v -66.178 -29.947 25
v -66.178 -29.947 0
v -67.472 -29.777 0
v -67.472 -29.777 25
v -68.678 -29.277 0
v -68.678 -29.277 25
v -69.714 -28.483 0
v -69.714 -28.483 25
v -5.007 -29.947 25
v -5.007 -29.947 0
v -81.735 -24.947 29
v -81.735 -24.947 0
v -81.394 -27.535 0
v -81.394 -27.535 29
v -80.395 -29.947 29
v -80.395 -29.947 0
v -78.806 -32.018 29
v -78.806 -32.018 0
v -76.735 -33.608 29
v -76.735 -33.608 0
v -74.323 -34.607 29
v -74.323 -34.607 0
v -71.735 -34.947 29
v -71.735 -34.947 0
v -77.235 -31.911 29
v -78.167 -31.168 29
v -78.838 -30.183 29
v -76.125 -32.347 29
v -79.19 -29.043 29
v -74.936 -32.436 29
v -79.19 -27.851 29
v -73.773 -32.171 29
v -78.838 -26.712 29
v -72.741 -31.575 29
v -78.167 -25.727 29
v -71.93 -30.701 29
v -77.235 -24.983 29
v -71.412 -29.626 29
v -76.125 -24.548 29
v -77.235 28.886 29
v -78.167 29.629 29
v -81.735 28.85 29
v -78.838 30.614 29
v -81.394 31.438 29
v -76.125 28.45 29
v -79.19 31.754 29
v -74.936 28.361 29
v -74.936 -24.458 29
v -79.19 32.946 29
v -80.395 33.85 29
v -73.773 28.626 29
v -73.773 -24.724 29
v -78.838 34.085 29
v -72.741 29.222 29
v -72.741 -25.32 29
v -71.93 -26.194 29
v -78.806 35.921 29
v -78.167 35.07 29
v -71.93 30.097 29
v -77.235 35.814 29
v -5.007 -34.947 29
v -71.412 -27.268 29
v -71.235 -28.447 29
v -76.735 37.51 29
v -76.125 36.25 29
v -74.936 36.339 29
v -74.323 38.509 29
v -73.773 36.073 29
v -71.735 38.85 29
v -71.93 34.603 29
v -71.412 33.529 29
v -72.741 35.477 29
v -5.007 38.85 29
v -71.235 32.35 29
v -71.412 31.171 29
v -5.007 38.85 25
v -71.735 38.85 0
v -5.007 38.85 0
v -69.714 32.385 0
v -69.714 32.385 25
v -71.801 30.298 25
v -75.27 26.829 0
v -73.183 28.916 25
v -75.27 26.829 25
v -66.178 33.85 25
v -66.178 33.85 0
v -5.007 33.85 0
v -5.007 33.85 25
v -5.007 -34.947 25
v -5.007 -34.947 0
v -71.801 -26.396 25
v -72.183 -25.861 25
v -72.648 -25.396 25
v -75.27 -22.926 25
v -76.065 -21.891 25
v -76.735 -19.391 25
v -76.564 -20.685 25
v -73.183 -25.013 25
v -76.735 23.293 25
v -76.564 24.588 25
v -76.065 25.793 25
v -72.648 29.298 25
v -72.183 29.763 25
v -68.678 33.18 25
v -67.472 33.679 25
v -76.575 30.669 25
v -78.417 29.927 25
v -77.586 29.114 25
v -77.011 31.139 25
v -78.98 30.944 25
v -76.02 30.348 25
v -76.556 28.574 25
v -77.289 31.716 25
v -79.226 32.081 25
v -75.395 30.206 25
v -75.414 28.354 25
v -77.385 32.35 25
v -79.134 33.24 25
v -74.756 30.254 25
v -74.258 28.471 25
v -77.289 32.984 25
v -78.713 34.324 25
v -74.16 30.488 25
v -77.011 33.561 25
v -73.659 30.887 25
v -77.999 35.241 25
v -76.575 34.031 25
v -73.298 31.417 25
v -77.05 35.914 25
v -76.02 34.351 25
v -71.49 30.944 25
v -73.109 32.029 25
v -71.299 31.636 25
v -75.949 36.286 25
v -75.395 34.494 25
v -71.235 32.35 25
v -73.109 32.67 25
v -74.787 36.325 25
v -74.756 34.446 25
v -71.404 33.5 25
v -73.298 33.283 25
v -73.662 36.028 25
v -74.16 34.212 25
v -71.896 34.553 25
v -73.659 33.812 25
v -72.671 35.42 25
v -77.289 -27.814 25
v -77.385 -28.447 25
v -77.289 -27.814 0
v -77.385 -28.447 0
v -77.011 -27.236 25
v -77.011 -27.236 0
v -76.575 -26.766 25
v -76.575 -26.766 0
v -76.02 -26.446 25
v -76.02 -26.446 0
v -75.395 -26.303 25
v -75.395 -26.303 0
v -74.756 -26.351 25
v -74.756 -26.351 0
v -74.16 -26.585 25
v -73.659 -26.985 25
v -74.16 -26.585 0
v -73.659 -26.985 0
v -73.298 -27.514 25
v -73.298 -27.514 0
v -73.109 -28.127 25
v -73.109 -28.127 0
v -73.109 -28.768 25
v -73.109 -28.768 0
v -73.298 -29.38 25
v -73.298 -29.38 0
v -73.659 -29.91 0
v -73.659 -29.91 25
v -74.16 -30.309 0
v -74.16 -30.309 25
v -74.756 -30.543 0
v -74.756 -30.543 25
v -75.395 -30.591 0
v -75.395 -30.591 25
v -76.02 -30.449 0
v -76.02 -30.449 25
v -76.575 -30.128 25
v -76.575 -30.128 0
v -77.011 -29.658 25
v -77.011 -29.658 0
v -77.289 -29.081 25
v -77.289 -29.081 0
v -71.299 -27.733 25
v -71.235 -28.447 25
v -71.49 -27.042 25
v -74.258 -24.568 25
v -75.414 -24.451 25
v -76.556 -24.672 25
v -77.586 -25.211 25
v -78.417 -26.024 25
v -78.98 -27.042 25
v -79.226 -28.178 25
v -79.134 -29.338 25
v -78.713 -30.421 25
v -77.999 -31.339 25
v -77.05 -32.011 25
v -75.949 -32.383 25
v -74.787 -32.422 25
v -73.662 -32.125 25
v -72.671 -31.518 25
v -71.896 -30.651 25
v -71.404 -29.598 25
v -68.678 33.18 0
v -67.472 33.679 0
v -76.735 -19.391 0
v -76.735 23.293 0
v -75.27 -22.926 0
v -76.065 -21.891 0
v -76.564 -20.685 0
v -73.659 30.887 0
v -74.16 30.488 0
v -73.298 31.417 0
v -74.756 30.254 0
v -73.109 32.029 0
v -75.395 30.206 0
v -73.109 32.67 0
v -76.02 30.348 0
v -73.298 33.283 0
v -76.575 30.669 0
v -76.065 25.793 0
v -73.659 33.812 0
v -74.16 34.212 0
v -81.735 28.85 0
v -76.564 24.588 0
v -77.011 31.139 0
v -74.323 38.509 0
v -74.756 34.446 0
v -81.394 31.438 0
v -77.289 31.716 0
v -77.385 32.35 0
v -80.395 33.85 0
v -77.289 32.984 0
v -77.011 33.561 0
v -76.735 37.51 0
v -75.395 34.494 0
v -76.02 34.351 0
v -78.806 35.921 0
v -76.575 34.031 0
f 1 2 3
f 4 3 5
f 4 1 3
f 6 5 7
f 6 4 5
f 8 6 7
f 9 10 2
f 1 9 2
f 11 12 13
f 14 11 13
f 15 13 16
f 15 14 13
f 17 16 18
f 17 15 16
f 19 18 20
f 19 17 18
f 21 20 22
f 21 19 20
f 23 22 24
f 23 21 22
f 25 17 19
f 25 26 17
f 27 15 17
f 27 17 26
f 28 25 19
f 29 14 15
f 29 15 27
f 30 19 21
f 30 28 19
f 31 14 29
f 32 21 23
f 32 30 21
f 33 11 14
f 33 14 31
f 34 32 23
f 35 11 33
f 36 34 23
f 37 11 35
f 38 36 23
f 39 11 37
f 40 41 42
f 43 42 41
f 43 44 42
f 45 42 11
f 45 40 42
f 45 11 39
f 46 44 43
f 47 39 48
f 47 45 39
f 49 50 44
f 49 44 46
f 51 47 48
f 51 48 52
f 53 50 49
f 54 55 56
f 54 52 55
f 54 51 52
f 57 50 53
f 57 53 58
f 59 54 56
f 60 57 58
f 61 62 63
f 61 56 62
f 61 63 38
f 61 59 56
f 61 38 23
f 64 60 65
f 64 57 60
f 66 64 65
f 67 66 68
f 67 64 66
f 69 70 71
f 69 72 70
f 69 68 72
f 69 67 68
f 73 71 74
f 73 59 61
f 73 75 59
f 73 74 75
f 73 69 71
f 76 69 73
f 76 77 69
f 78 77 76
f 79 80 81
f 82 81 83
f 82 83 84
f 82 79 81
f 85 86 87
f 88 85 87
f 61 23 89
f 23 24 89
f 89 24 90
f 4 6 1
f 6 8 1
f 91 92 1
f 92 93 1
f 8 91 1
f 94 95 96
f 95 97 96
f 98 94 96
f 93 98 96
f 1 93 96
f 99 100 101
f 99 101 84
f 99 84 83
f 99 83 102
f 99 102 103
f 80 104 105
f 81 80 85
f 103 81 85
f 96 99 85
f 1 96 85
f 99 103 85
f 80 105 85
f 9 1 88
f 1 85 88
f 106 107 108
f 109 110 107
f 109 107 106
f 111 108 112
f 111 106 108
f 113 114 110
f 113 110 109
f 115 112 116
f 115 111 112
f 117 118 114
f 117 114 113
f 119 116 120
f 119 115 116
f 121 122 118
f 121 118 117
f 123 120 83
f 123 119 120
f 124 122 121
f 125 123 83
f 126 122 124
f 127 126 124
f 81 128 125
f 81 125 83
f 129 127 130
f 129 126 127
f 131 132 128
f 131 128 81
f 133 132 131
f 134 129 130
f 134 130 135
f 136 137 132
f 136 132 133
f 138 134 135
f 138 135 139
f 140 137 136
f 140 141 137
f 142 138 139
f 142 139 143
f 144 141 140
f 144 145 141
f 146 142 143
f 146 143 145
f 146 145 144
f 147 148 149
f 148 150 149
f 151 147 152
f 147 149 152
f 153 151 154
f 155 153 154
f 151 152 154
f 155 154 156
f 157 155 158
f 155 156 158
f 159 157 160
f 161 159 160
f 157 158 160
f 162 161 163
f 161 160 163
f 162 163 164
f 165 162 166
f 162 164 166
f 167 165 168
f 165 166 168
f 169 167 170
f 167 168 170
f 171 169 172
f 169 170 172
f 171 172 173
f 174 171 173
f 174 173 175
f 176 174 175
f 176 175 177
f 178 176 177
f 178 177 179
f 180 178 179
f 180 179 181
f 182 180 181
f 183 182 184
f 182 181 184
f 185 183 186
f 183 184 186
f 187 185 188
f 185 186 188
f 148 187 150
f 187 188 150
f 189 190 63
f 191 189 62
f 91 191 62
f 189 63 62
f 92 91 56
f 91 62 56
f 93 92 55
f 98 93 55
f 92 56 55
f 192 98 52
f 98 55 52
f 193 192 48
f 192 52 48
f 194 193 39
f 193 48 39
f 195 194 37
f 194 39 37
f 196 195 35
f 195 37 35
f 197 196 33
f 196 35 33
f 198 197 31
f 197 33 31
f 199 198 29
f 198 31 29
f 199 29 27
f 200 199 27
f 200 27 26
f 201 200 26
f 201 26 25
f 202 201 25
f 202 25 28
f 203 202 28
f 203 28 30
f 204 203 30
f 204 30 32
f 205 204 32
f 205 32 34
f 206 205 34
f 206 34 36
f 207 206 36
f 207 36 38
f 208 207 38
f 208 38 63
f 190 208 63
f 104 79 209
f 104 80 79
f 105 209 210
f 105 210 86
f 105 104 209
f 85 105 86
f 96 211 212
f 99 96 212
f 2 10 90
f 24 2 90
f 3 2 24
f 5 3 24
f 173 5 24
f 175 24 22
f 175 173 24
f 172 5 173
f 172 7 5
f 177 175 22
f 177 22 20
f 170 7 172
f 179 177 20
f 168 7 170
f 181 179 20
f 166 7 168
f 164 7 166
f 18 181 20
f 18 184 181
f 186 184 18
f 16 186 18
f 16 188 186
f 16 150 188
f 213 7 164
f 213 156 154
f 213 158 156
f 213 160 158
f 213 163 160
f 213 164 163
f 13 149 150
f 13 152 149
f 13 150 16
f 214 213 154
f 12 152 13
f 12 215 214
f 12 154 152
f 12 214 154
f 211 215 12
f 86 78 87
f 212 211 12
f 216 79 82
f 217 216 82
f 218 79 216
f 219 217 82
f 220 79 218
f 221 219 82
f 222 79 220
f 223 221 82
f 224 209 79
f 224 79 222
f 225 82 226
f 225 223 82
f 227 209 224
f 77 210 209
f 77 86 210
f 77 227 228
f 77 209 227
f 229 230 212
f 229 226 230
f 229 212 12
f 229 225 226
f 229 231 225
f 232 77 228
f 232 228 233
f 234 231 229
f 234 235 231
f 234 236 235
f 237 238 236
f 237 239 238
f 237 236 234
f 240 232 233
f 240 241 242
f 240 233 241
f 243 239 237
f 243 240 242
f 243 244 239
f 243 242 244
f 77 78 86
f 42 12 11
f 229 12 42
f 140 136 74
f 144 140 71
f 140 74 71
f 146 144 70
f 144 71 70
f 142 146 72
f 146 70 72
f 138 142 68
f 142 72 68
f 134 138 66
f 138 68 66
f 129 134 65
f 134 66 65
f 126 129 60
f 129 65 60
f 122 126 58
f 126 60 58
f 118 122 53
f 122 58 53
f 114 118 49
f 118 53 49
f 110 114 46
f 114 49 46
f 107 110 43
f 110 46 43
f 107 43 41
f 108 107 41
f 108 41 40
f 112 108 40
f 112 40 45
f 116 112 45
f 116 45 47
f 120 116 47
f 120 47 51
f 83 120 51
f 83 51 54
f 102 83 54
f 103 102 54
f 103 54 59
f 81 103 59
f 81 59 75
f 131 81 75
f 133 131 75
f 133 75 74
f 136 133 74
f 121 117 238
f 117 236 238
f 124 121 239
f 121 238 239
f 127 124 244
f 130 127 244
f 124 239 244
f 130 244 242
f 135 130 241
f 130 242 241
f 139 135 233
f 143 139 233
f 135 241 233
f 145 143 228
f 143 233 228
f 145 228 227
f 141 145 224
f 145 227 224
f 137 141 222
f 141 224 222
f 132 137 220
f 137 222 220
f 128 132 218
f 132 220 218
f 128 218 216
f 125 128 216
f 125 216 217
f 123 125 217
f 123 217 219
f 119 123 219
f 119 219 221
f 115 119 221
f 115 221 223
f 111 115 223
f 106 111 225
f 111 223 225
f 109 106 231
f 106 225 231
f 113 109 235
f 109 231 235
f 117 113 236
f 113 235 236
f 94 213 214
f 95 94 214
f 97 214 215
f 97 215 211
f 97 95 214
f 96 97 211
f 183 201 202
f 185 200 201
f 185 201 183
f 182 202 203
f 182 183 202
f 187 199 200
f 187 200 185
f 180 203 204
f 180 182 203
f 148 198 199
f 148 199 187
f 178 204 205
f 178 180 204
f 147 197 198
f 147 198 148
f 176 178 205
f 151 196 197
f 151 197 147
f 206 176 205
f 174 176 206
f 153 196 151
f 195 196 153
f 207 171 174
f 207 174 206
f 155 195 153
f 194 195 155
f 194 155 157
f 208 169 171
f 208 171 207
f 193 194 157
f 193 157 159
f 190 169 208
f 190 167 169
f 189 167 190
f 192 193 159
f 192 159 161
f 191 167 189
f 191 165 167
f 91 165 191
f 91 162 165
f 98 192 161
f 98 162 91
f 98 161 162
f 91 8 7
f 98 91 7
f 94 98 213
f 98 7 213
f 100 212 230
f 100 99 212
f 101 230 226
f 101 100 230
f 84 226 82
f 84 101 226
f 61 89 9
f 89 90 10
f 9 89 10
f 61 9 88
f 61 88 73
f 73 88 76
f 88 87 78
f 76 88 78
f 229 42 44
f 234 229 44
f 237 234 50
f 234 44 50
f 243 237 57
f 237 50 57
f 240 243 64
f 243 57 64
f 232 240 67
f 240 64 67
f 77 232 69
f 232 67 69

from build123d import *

# Parameters (mm, degrees)
EXTRUDE_THIN1_DEPTH            = 25
BOSS_EXTRUDE1_DEPTH            = 25
SKETCH3_W                      = 76.727105056
SKETCH3_H                      = 73.797041503
BOSS_EXTRUDE2_DEPTH            = 4
FILLET1_R                      = 10
FILLET2_R                      = 5
CBORE_FOR_M4_SHCS1_D           = 4.3
CBORE_FOR_M4_SHCS1_CBORE_D     = 8
CBORE_FOR_M4_SHCS1_CBORE_DEPTH = 4


with BuildPart() as part:
    # Sketch1 → Extrude-Thin1 (new body)
    with BuildSketch(Plane.XY):
        Polygon((-5.007497798, -29.94725217), (-76.734602854, -29.94725217), (-76.734602854, 33.849789333), (-5.007497798, 33.849789333), (-5.007497798, 38.849789333), (-81.734602854, 38.849789333), (-81.734602854, -34.94725217), (-5.007497798, -34.94725217), align=None)
    extrude(amount=EXTRUDE_THIN1_DEPTH)

    # Sketch2 → Boss-Extrude1 (add)
    with BuildSketch(Plane.XY):
        Polygon((-68.24932148, 33.849789333), (-76.734602854, 25.364507959), (-76.734602854, 33.849789333), align=None)
        Polygon((-76.734602854, -29.94725217), (-68.24932148, -29.94725217), (-76.734602854, -21.461970795), align=None)
    extrude(amount=BOSS_EXTRUDE1_DEPTH)

    # Sketch3 → Boss-Extrude2 (add)
    with BuildSketch(Plane.XY.offset(25)):
        with Locations((-43.371050326, 1.951268582)):
            Rectangle(SKETCH3_W, SKETCH3_H)
    extrude(amount=BOSS_EXTRUDE2_DEPTH)

    # Fillet1
    fillet1_edges = [part.edges().sort_by_distance(p)[0] for p in [
        (-81.734602854, -34.94725217, 14.5),
        (-81.734602854, 38.849789333, 14.5),
    ]]
    fillet(fillet1_edges, radius=FILLET1_R)

    # Fillet2
    fillet2_edges = [part.edges().sort_by_distance(p)[0] for p in [
        (-68.24932148, -29.94725217, 12.5),
        (-76.734602854, -21.461970795, 12.5),
        (-68.24932148, 33.849789333, 12.5),
        (-76.734602854, 25.364507959, 12.5),
    ]]
    fillet(fillet2_edges, radius=FILLET2_R)

    # CBORE for M4 SHCS1 (through all)
    with Locations(Plane(origin=(-75.234602854, 32.349789333, 29), x_dir=(1, 0, 0), z_dir=(0, 0, 1))):
        with Locations((0, 0), (0, -60.797041503)):
            CounterBoreHole(CBORE_FOR_M4_SHCS1_D / 2, CBORE_FOR_M4_SHCS1_CBORE_D / 2, CBORE_FOR_M4_SHCS1_CBORE_DEPTH)


solid = part.part
